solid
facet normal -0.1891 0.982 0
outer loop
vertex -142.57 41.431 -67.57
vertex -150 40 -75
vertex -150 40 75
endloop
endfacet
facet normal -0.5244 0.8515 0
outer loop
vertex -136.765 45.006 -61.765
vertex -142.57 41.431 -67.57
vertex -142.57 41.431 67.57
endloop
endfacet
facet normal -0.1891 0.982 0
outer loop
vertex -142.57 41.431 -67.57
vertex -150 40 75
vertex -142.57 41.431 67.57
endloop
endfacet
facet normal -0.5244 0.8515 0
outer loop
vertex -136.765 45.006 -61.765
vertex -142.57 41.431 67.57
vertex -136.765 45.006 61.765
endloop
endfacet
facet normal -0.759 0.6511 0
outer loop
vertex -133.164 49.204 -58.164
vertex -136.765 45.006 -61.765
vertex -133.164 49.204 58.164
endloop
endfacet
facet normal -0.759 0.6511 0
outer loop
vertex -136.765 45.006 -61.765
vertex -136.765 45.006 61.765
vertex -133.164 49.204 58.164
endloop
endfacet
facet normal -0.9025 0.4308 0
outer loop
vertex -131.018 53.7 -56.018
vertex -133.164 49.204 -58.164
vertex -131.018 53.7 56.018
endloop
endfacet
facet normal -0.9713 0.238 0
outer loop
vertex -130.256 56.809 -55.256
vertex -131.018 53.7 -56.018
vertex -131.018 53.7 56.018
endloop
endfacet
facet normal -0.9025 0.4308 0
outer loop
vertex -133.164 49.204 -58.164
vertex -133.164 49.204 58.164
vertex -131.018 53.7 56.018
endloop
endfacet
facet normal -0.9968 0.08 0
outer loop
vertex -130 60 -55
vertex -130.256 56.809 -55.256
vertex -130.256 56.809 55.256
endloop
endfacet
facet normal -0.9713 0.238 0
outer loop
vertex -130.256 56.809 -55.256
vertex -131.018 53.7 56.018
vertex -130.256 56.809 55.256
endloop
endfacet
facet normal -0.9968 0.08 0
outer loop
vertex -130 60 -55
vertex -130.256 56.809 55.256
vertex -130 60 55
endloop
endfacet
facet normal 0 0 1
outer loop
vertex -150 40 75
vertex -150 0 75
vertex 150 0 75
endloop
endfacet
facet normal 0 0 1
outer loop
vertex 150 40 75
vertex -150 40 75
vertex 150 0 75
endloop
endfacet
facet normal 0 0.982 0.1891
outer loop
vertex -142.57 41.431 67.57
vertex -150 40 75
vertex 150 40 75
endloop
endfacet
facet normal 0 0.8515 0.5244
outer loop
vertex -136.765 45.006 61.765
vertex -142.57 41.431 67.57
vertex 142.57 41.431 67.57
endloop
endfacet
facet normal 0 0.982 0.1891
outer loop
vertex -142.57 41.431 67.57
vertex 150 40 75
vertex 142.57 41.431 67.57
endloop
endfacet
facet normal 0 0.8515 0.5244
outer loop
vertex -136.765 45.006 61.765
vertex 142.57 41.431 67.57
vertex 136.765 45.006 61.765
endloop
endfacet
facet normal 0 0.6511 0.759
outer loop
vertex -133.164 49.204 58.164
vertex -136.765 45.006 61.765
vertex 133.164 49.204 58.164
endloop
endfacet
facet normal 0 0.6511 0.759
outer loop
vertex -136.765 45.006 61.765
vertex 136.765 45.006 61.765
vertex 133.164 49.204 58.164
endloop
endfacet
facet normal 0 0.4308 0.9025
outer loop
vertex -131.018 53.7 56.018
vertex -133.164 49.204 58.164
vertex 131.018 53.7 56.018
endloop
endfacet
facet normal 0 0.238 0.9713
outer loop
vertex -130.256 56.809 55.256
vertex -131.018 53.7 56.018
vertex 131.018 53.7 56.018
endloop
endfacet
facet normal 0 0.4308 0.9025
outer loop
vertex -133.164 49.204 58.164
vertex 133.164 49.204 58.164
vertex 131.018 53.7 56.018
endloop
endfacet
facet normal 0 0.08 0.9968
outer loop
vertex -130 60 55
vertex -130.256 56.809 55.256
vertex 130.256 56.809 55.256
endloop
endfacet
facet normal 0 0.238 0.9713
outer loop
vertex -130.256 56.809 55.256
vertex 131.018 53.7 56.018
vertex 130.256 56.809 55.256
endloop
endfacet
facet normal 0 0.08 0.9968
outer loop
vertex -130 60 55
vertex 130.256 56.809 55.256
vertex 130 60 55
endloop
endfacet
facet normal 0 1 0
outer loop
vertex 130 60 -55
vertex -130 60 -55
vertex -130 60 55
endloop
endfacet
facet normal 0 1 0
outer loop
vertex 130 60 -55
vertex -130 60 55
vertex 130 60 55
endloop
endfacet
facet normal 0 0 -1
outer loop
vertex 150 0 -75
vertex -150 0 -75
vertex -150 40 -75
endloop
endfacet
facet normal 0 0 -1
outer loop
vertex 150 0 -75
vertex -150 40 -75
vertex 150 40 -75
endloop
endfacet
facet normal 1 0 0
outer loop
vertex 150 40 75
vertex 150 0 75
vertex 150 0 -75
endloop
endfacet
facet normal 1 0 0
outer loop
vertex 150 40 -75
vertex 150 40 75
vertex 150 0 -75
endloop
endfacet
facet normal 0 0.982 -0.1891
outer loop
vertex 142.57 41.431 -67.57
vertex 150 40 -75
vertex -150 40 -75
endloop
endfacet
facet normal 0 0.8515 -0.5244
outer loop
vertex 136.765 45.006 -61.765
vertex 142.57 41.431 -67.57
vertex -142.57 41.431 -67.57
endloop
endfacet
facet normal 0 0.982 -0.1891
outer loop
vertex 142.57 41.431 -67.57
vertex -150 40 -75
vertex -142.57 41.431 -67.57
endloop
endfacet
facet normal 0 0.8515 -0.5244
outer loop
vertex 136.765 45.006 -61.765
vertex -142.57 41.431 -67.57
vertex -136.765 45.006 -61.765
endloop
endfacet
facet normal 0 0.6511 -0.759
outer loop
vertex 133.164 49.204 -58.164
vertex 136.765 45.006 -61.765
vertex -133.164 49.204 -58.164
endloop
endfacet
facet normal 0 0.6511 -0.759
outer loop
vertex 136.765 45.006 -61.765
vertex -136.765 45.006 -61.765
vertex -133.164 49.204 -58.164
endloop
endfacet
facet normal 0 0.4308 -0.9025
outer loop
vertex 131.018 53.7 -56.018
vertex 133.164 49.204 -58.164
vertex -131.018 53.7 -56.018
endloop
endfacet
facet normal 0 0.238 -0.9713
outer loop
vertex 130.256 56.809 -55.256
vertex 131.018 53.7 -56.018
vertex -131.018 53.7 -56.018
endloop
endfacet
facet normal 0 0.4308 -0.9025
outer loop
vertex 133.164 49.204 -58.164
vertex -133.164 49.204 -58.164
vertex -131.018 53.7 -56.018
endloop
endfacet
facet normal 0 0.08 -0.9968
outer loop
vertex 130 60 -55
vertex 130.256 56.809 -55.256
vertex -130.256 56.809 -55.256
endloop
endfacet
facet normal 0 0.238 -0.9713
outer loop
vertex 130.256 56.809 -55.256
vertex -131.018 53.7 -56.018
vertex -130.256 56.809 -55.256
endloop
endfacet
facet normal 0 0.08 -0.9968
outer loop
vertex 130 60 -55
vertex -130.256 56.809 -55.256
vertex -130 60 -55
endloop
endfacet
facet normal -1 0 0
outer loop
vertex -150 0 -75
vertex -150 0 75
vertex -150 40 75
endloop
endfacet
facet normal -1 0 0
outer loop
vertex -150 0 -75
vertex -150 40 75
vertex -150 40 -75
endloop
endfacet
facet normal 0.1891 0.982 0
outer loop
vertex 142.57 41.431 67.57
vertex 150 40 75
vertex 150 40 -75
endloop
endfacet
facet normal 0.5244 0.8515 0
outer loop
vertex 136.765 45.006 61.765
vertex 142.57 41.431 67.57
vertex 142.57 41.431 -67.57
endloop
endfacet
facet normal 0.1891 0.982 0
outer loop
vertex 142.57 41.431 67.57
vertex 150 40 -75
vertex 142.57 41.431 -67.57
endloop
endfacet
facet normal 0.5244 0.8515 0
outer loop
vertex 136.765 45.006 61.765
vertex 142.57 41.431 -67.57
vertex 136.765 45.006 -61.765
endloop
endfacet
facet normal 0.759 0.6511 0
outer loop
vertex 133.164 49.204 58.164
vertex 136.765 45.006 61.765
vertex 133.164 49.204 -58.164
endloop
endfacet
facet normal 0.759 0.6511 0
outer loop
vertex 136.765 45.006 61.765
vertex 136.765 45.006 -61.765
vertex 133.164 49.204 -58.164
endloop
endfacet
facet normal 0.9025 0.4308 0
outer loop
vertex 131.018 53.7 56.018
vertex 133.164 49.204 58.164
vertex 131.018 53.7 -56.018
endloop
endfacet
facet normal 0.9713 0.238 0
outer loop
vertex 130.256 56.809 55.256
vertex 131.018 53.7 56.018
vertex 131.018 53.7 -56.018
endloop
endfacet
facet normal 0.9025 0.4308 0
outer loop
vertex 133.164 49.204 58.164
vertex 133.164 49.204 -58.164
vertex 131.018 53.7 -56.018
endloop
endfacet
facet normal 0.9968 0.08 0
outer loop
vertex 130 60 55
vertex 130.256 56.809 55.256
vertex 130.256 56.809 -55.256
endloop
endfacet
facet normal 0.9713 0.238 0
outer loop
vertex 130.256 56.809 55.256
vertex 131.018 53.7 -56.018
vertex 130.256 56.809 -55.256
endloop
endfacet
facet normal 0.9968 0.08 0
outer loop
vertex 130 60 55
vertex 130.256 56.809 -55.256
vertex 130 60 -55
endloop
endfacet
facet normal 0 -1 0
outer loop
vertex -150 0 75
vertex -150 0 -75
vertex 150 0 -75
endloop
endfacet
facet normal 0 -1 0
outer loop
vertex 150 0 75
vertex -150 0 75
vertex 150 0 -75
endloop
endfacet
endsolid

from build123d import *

# Parameters (mm, degrees)
SKETCH2_W           = 300
SKETCH2_H           = 150
BOSS_EXTRUDE1_DEPTH = 60
SKETCH3_R           = 20


with BuildPart() as part:
    # Sketch2 → Boss-Extrude1 (new body)
    with BuildSketch(Plane(origin=(0, 0, 0), x_dir=(1, 0, 0), z_dir=(0, 1, 0))):
        Rectangle(SKETCH2_W, SKETCH2_H)
    extrude(amount=BOSS_EXTRUDE1_DEPTH)

    # Cut-Sweep3: sweep along a path in Sketch4
    with BuildLine(Plane(origin=(0, 60, 0), x_dir=(1, 0, 0), z_dir=(0, 1, 0))) as cut_sweep3_path:
        Line((-150, 75), (-150, -75))
        Line((-150, -75), (150, -75))
        Line((150, -75), (150, 75))
        Line((150, 75), (-150, 75))
    # Sketch3 → Cut-Sweep3 (sweep, cut)
    with BuildSketch(Plane.XY):
        with Locations((150, 60)):
            Circle(SKETCH3_R)
    sweep(path=cut_sweep3_path.line, transition=Transition.RIGHT, mode=Mode.SUBTRACT)


solid = part.part
